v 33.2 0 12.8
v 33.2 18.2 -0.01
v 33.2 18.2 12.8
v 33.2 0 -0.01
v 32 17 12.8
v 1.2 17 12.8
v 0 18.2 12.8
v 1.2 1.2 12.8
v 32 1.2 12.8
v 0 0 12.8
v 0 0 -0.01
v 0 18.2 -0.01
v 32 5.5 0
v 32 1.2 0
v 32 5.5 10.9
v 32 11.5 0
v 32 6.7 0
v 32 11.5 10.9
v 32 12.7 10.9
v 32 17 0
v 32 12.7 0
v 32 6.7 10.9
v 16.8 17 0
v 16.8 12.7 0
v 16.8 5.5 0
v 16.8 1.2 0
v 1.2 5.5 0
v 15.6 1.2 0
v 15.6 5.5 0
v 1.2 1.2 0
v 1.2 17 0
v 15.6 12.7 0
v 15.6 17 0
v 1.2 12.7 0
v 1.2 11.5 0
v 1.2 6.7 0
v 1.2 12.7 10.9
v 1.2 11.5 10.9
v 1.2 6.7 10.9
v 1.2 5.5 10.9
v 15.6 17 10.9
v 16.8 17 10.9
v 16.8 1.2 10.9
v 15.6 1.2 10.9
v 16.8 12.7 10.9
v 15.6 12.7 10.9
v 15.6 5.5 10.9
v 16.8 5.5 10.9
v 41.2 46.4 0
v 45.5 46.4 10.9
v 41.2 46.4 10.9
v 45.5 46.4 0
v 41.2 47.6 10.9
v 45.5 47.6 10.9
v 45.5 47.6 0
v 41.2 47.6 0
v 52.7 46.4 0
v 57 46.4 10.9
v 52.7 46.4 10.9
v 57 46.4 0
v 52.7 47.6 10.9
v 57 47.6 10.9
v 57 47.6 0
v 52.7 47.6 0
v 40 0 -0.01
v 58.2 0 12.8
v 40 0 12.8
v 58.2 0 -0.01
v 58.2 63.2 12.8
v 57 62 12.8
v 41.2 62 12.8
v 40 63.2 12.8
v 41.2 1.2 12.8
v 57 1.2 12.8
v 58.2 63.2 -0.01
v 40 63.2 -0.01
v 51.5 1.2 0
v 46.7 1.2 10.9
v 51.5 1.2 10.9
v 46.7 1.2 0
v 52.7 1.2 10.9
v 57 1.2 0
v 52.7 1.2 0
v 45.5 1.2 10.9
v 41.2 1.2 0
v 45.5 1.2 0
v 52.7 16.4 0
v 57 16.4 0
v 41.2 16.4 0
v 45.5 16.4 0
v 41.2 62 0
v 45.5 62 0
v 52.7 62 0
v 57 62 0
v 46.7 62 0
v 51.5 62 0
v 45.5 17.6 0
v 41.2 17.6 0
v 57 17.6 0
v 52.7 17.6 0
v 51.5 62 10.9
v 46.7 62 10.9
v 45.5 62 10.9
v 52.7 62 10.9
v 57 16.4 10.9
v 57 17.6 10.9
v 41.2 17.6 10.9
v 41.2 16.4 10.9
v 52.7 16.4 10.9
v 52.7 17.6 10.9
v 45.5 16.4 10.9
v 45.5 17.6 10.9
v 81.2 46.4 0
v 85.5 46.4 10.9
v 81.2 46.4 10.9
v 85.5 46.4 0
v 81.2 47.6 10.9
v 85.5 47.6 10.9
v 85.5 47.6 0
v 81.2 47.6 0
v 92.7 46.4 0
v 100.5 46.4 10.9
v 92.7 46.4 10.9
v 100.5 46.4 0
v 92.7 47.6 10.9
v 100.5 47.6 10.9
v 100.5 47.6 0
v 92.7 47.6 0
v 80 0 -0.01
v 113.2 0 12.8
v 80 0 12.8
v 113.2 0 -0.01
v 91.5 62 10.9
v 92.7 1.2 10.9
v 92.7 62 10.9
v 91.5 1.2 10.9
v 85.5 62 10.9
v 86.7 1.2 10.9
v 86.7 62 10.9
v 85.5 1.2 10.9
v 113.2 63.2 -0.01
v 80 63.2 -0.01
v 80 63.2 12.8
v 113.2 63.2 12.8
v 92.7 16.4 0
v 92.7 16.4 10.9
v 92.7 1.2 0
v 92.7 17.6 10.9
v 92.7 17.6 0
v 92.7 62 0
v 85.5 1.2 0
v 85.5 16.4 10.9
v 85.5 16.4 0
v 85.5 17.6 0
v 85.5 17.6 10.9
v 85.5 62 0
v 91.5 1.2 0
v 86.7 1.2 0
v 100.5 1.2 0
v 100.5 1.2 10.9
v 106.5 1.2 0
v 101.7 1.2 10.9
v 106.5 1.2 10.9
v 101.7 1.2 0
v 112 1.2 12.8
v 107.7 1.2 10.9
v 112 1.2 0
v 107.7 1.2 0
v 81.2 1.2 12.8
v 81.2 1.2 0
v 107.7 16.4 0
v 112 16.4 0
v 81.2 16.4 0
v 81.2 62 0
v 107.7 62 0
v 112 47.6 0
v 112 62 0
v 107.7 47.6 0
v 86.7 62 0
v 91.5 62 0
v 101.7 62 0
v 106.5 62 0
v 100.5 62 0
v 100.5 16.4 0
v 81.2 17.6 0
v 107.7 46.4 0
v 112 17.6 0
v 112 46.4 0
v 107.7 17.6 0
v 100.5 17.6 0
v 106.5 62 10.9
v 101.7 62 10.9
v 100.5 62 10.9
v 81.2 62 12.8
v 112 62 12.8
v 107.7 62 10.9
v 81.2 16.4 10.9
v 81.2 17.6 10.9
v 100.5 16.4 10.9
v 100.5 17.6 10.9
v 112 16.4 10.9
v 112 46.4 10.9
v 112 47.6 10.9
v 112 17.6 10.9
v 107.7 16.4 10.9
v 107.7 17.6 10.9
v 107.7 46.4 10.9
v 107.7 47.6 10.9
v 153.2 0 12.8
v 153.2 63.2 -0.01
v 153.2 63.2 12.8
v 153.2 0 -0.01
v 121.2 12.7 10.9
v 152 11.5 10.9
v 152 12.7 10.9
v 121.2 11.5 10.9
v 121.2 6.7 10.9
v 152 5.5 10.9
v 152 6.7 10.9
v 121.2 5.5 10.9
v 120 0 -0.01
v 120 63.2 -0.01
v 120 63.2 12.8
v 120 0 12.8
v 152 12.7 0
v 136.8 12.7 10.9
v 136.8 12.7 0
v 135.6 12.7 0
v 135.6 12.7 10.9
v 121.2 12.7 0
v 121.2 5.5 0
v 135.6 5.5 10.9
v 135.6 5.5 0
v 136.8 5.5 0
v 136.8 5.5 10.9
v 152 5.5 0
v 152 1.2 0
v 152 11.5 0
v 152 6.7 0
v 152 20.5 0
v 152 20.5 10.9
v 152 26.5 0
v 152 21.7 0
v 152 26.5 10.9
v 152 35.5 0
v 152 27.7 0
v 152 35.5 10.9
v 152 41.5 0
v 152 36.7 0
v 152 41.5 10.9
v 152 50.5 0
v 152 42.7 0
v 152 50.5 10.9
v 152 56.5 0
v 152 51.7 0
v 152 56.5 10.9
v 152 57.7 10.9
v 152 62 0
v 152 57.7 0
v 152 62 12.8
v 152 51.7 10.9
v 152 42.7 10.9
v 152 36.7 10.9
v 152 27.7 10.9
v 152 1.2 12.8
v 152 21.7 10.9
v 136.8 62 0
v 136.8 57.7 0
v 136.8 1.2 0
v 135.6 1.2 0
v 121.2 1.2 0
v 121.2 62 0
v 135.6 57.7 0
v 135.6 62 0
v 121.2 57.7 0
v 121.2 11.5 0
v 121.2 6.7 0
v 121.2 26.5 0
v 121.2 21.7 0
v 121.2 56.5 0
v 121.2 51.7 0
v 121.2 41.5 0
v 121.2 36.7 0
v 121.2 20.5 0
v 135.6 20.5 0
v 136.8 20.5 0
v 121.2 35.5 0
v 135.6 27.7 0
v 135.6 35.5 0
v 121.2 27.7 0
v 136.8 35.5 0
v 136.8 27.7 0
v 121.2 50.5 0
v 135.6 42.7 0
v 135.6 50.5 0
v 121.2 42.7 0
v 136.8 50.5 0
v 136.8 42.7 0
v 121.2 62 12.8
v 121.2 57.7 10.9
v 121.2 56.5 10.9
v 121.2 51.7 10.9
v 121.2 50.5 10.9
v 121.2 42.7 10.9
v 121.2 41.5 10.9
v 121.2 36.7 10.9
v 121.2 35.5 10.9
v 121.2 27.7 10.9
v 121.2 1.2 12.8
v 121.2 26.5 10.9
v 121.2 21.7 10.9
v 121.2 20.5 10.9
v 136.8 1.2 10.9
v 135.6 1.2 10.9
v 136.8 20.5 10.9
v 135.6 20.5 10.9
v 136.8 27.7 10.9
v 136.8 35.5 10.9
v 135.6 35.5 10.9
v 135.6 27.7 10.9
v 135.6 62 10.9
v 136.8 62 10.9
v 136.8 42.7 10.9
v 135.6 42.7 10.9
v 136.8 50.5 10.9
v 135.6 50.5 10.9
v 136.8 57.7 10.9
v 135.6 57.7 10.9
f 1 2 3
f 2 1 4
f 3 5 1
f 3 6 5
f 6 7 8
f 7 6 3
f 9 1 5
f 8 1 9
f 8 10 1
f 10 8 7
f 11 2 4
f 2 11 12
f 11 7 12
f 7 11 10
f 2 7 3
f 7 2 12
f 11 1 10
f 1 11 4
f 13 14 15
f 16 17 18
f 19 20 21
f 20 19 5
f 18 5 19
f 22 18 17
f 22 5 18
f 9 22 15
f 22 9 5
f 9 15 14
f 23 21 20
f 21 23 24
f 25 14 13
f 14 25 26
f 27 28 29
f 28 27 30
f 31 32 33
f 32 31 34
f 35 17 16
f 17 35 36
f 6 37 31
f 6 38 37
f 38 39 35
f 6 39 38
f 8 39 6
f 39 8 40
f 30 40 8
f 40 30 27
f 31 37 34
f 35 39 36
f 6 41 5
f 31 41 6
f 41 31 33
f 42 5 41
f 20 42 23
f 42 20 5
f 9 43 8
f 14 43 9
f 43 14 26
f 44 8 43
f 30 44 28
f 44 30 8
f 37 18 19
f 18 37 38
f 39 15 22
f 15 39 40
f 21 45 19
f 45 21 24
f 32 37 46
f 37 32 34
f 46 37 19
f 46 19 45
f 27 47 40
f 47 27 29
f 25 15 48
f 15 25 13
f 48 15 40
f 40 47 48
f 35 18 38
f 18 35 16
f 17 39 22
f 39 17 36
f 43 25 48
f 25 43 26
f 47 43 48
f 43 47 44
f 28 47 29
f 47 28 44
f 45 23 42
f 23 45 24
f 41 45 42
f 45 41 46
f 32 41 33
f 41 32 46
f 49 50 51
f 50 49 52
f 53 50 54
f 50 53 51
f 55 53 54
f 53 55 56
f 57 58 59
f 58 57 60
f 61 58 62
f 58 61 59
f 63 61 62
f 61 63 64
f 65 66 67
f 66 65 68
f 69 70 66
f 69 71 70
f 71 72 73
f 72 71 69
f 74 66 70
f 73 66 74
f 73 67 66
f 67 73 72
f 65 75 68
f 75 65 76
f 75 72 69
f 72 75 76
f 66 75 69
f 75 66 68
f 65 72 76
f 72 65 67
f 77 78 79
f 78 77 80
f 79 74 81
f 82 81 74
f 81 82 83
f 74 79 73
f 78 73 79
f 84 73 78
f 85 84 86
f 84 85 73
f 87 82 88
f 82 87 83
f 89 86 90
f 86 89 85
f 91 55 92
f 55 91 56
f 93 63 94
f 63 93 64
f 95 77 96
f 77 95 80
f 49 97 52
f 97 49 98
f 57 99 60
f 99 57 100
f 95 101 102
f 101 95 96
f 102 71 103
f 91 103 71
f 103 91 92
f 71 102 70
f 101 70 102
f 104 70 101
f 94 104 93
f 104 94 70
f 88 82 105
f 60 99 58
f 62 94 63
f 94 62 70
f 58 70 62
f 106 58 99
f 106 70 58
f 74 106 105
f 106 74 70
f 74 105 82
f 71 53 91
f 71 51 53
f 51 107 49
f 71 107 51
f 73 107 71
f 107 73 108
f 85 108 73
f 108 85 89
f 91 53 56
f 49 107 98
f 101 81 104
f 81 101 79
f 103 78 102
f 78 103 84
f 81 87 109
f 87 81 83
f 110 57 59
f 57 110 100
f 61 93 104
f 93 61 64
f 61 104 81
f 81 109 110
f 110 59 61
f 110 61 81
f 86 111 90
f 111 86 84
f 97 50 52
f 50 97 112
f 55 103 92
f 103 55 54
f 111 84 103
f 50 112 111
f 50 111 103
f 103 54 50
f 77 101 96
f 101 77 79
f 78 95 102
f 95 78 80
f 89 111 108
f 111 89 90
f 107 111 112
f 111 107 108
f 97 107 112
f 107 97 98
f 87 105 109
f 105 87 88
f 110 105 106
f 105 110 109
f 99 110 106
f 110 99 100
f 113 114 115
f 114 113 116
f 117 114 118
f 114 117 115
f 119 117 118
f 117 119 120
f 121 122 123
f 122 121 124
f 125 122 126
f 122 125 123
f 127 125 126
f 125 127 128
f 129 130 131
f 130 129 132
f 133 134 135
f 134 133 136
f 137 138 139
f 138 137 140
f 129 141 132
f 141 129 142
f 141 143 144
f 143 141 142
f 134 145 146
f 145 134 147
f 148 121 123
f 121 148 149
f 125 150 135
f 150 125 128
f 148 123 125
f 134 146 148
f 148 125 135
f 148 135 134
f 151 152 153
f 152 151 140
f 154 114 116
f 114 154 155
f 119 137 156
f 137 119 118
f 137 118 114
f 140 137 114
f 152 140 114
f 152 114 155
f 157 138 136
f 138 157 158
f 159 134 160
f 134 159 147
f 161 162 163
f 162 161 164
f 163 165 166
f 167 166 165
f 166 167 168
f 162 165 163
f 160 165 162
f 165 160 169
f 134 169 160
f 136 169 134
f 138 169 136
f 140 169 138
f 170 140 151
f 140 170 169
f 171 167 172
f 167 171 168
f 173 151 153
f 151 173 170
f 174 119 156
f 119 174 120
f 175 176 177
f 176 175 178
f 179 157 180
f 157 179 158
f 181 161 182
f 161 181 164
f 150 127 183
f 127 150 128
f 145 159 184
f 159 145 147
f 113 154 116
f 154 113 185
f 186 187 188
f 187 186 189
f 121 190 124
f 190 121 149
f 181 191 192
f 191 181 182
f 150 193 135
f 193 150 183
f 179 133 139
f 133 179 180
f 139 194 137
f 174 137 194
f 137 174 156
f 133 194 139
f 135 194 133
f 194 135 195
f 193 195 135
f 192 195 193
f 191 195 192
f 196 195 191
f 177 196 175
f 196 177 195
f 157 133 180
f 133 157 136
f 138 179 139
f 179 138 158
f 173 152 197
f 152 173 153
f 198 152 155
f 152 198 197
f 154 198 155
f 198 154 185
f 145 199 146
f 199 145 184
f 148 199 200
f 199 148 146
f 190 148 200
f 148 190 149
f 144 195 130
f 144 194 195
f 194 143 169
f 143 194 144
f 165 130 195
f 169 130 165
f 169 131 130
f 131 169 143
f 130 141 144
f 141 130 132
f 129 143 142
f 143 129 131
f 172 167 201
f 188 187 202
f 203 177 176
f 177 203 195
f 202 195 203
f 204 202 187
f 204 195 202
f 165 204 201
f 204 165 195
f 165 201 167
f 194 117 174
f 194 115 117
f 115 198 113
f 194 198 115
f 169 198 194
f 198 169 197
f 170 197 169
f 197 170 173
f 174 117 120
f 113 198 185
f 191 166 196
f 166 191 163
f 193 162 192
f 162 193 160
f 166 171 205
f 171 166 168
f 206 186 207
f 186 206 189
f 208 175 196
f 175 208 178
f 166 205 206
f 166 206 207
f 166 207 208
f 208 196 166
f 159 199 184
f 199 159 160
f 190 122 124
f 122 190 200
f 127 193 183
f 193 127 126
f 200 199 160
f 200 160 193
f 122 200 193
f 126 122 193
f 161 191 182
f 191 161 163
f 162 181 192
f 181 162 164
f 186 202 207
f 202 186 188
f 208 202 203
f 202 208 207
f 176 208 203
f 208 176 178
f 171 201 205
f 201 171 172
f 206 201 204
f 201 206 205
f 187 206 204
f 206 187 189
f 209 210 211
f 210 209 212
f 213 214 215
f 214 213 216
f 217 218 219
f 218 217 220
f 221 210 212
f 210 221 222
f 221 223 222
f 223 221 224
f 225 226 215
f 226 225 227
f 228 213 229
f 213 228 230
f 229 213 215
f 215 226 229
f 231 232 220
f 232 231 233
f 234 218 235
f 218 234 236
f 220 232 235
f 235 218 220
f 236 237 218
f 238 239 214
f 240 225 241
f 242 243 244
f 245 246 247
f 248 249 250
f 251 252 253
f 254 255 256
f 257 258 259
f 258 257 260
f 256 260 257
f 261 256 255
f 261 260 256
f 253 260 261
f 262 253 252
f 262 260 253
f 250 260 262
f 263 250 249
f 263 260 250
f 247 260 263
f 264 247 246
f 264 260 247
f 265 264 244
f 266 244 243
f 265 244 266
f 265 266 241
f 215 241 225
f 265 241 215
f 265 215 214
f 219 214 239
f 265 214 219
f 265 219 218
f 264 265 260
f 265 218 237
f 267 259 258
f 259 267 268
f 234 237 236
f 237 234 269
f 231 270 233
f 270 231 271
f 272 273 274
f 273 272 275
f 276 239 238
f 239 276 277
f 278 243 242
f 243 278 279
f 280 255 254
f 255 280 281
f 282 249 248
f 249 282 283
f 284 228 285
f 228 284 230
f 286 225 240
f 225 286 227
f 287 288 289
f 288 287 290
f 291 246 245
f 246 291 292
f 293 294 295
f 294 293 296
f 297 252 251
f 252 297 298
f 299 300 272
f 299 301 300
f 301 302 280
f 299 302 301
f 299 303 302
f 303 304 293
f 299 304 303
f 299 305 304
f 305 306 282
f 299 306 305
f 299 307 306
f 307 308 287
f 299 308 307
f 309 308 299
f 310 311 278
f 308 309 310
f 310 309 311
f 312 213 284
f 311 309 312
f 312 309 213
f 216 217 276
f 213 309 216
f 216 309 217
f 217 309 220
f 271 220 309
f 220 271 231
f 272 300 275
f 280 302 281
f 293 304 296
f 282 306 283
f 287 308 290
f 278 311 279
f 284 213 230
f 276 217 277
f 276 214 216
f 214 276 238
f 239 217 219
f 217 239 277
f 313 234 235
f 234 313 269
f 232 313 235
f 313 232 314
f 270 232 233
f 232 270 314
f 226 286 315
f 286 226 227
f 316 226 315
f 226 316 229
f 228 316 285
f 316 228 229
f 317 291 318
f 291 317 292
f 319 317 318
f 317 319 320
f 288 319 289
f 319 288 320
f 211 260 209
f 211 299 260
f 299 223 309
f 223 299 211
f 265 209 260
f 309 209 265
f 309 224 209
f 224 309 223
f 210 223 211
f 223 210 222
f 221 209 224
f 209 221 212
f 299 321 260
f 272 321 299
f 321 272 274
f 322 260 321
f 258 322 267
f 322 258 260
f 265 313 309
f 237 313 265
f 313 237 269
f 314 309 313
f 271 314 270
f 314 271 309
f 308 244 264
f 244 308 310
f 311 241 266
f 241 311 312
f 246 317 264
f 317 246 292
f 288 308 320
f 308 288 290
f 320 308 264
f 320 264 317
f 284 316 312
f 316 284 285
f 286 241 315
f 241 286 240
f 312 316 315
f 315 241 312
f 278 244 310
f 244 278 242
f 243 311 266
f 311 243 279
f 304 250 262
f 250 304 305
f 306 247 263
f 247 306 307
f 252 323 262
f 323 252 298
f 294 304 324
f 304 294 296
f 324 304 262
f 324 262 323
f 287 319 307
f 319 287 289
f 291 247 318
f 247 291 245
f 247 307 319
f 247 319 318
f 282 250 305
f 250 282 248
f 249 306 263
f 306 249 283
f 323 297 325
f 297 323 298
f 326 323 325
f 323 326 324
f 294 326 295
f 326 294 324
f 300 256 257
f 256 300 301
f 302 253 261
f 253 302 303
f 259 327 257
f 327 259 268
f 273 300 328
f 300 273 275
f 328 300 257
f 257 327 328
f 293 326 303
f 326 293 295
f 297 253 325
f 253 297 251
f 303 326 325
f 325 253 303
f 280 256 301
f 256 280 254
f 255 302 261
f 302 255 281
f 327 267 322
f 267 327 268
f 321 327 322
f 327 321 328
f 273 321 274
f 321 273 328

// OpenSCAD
// file: ../../Base/Boxes.scad
// Fischertechnik Box Foundation
// Pre-designed Boxes

use <Constants.scad>

include <PlacementOptions.scad>

box190Width = 190;
box190Depth = 130;
box130Width = 130;
box130Depth = 95;
boxUsageHeight = 33.9;
boxWallThickness = 2.4;
boxBaseThickness = 1.0;
boxWebWidth = 3.0;

// getBoxWallThickness()
// Gets the wall thickness of a Fischertechnik Box

function getBoxWallThickness() = boxWallThickness;

// Gets the usable height of a fischertechnik box
function getBoxUsageHeight() = boxUsageHeight;

// Gets the thickness of the Fischertechnik box base.
function getBoxBaseThickness() = boxBaseThickness;

// Gets the width of a box web
function getBoxWebWidth() = boxWebWidth;

// Gets the usable inner space of a Box 190 as an x/y-list
function getBox190Space() = [
    box190Width - 2*getBoxWallThickness(), 
    box190Depth - 2*getBoxWallThickness() ];

// Imports the Fischertechnik empty box 130x190 mm and places it at position 0,0
// 190x130 are the outer sizes, the inner space is slightly smaller. Use getBox190Space() to get the inner sizes.
// This module needs the STL file "Fischertechnik Box 130x190.stl" in the library path.
// The box is positioned that the usable inner space is at the 0,0,0 position. The

module Box190() {
    translate([-getBoxWallThickness(),-getBoxWallThickness(),-getBoxBaseThickness()])
        import("Fischertechnik Box 130x190.stl", convexity=3);
}

// Gets the usable inner space of a Box 130 as an x/y-list
function getBox130Space() = [
    box130Width - 2*getBoxWallThickness(), 
    box130Depth - 2*getBoxWallThickness() ];

// Imports the Fischertechnik empty box 95x130 mm and places it at position 0,0
// 190x130 are the outer sizes, the inner space is slightly smaller. Use getBox190Space() to get the inner sizes.
// This module needs the STL file "Fischertechnik Box 95x130.stl" in the library path.
// The box is positioned that the usable inner space is at the 0,0,0 position. The

module Box130() {
    translate([-getBoxWallThickness(),-getBoxWallThickness(),-getBoxBaseThickness()])
        import("Fischertechnik Box 95x130.stl", convexity=3);
}

// Creates a web at the specified box walls
// corner 0 = LowerLeft, 1 = UpperLeft, 2 = UpperRight, 3 = LowerRight
// side 0 = LeftOfCorner, 1 = RightOfCorner
// distance = Distance in mm from the corner
// box = inner width and depth of the box (default: Box 190)
// webWidth = length of the web (default is 3 mms)
// webThickness = thickness of the web (default is 1 mm)

module BoxWeb(corner, side, distance, box=getBox190Space(), webWidth=getBoxWebWidth(), webThickness=1.0) {
    sink = getBoxWallThickness()/2;

    width = (corner % 2 == 0) ? 
            (side == LeftOfCorner ? webWidth : webThickness) :
            (side == LeftOfCorner ? webThickness : webWidth);

    depth = (corner % 2 == 0) ? 
            (side == RightOfCorner ? webWidth : webThickness) :
            (side == RightOfCorner ? webThickness : webWidth);
    
    xDiff = corner == LowerLeft ? 
                (side == LeftOfCorner ? -sink : distance) :
            (corner == UpperLeft ?                
                (side == LeftOfCorner ? distance : -sink) :
            (corner == UpperRight ?
                (side == LeftOfCorner ? box.x-webWidth+sink : box.x-distance-webThickness) :
                (side == LeftOfCorner ? box.x-distance-webThickness: box.x-webWidth+sink)));

    yDiff = corner == LowerLeft ? 
                (side == RightOfCorner ? -sink : distance) :
            (corner == UpperLeft ?
                (side == RightOfCorner ? box.y-distance : box.y-webWidth+sink) :
            (corner == UpperRight ?
                (side == RightOfCorner ? box.y-webWidth+sink : box.y-distance) :
                (side == RightOfCorner ? distance : -sink)));
    
    translate([xDiff, yDiff, -getExcess()])
        cube([width, depth, boxUsageHeight + 2*getExcess()]);
}
// file: ../../Base/Rotation.scad
// Fischertechnik Box Foundation
// Geometry Helpers Rotation

include <PlacementOptions.scad>

// getRotatedSpace(space, rotation=NoRotation)
// Rotates the space dependent on the specified rotation

function getRotatedSpace(space, rotation=NoRotation) = [
    (rotation == Rotate90 || rotation == Rotate270) ? space.y : space.x,
    (rotation == Rotate90 || rotation == Rotate270) ? space.x : space.y
];

// Rotates the given space around the fixed left lower corner
// space = the space the children needs as width/depth list [width,depth]
// rotation = 0 Rotate0 degrees, 1 Rotate90 degrees, 2 Rotate180 degrees, 3 Rotate270 degrees (equivalent to -90)

module RotateFix(space, rotation=Rotate0) {
    dy = (rotation == Rotate0 || rotation == Rotate270) ? 0 :
        (rotation == Rotate90) ? space.x :
        space.y;
    dx = (rotation < Rotate180) ? 0 :
        (rotation == Rotate180) ? space.x :
        space.y;
    
    translate([dx, dy, 0])
        rotate([0, 0, rotations[rotation]])
            children();
}
// file: ../../Base/Alignment.scad
// Fischertechnik Box Foundation
// Geometry Helpers Alignment

include <PlacementOptions.scad>

// getAlignedX(elementWidth, spaceWidth, align=AlignRight, offset=0)
// Gets the aligned X offset of an element with the given
// width in the given space.
// elementWidth = The width of the element to positon
// spaceWidth = The space where the element should be aligned
// align = 0 AlignLeft, 1 AlignCenter, 2 AlignRight
// offset = an optional offset from the aligned position. When
// aligned left or centered, then positive values are in X direction.
// When aligned right then positive values are in negative X direction.

function getAlignedX(elementWidth, spaceWidth, align=AlignRight, offset=0) =
    (align == AlignLeft) ?
        offset :
        ((align == AlignCenter) ?
        (spaceWidth - elementWidth)/2 + offset :
        spaceWidth - offset - elementWidth);

// getAlignedY(elementDepth, spaceDepth, align=AlignTop, offset=0)
// Gets the aligned Y offset of an element with the given
// depth in the given space.
// elementDepth = The depth of the element to positon
// spaceDepth = The space where the element should be aligned
// align = 0 AlignBottom, 1 AlignCenter, 2 AlignTop
// offset = an optional offset from the aligned position. When
// aligned bottom or centered, then positive values are in Y direction.
// When aligned top then positive values are in negative Y direction.

function getAlignedY(elementDepth, spaceDepth, align=AlignTop, offset=0) =
    (align == AlignBottom) ?
        offset :
        ((align == AlignCenter) ?
        (spaceDepth - elementDepth)/2 + offset :
        spaceDepth - offset - elementDepth);
// file: ../../Base/Constants.scad
// Fischertechnik Box Foundation
// Constants

// Constant values necessary for multiple elements

// Base constants
dividerThickness = 1.2;
excess = 0.01;
fragments = 90;
tolerance = 0.8;

// Gets the thickness of a divider 
function getDividerThickness() = dividerThickness;

// Gets the excess that is used to merge walls into each other
function getExcess() = excess;

// Gets amount of fragments of a cylinder
function getFragments() = fragments;

// Gets the inner tolerance of a frame to each side
function getTolerance() = tolerance;


// Fischertechnik specific constants
axisDiameter = 4;
axisBottomDiameter = axisDiameter + 1;
standardEdgeDistance = 2.5;
standardWebDistance = 11.5;
standardCornerLength = 15;
tubeWallFactor = 1.6;

// Gets axis diameter
function getAxisDiameter() = axisDiameter;

// Gets axis bottom diameter for thicker part at the bottom
function getAxisBottomDiameter() = axisBottomDiameter;

// gets the standard distance to the wall of the box for dockable frames with webs
function getStandardEdgeDistance() = standardEdgeDistance;

// gets the standard distance of each web to the corner of the dockable frame
function getStandardWebDistance() = standardWebDistance;

// gets the standard length of the corner walls of a dockable frame
function getStandardCornerLength() = standardCornerLength;

// gets the wall thickness of a tube.
function getTubeWallThickness() = tubeWallFactor * getDividerThickness();
// file: ../../Base/PlacementOptions.scad
// Fischertechnik Box Foundation
// Placement Options

// Alignment
NoAlign = 0;
AlignLeft = 1;
AlignBottom = 2;
AlignCenter = 3;
AlignRight = 4;
AlignTop = 5;

// Element rotation degree steps
rotations = [0, -90, -180, -270];

// Rotation
NoRotation = 0;
Rotate0 = 0;
Rotate90 = 1;
Rotate180 = 2;
Rotate270 = 3;

// Docking (seen from above)
NoDock = -1;
DockLeft = 0;
DockTop = 1;
DockRight = 2;
DockCorner = 2;
DockBottom = 3;

// Web corners
LowerLeft = 0;
UpperLeft = 1;
UpperRight = 2;
LowerRight = 3;

// Web position relative to corner
LeftOfCorner = 0;
RightOfCorner = 1;
// file: ../../Base/Placement.scad
// Fischertechnik Box Foundation
// Geometry Helpers Placement

use <Constants.scad>
use <Alignment.scad>
use <Rotation.scad>
use <Boxes.scad>

include <PlacementOptions.scad>

// Place(x=0, y=0, elementSpace=[0,0], alignX=AlignLeft, alignY=AlignBottom, rotation=Rotate0, boxSpace=getBox190Space())
// Places the child at the specified position
// y = Y-Position. This is a relative position when an X aligment is specified.
// x = X-Position. This is a relative position when an Y aligment is specified.
// elementSpace = space of the element to be placed [x,y]
// alignX = -1=NoAlign, 0 AlignLeft, 1 AlignCenter, 3 AlignRight (elementSpace and boxSpace required!)
// alignY = -1=NoAlign, 2 AlignBottom, 1 AlignCenter, 4 AlignTop (elementSpace and boxSpace required!)
// rotation = 0 Rotate0 0 degrees, 1 Rotate90 90 degrees, 
// 2 Rotate180 180 degrees, 3 Rotate270 270 degrees (equivalent to -90)
// boxSpace = Inner space of the box where the placement occurs [x,y] - default is Box 190x130 inner space

module Place(x=0, y=0, elementSpace=[0,0], 
  alignX=AlignLeft, alignY=AlignBottom, 
  rotation=NoRotation, boxSpace=getBox190Space()) {

    module Position(x, y, space, rotation=Rotate0) {
        translate([x, y, 0])
            RotateFix(space, rotation)
                children(0);
    }

    space = getRotatedSpace(elementSpace, rotation);
    alignedX = getAlignedX(space.x, boxSpace.x, alignX, x);
    alignedY = getAlignedY(space.y, boxSpace.y, alignY, y);
    Position(alignedX, alignedY, elementSpace, rotation)
        children();
}

// Center(space=getBox130Space(), elementSpace=[0,0])
// space = Space where the children is centered. For cylinder use centered=true and no elementSpace.
// elementSpace = space of the element to be centered [x,y]

module Center(space=getBox190Space(), elementSpace=[0,0]) {
    translate([(space.x - elementSpace.x) / 2, (space.y - elementSpace.y) / 2])
        children(0);
}

// CenterHorizontal(width=0, y=0, offset=0, space=getBox130Space())
// space = Space where the children is centered. For cylinder use centered=true and no elementSpace.
// elementSpace = space of the element to be centered [x,y]

module CenterHorizontal(width=0, y=0, offset=0, space=getBox190Space()) {
    translate([(space.x - width) / 2 + offset, y])
        children(0);
}

// CenterVertical(depth=0, x=0, offset=0, space=getBox130Space())
// space = Space where the children is centered. For cylinder use centered=true and no elementSpace.
// elementSpace = space of the element to be centered [x,y]

module CenterVertical(depth=0, x=0, offset=0, space=getBox190Space()) {
    translate([x, (space.y - depth) / 2 + offset])
        children(0);
}
// main file
// Fischertechnik Box Foundation
// ModelBase Complex
// Test FrameRack

use <../../Base/Placement.scad>
use <../../ModelBase/Complex.scad>

include <../../Base/PlacementOptions.scad>

FrameRack();

Place(40, 0, getFrameRackSpace(2), rotation=Rotate90)
    FrameRack(2);

Place(80, 0, getFrameRackSpace(2, 2), rotation=Rotate90)
    FrameRack(2, 2);

Place(120, 0, getFrameRackSpace(1, 4))
    FrameRack(1, 4);
